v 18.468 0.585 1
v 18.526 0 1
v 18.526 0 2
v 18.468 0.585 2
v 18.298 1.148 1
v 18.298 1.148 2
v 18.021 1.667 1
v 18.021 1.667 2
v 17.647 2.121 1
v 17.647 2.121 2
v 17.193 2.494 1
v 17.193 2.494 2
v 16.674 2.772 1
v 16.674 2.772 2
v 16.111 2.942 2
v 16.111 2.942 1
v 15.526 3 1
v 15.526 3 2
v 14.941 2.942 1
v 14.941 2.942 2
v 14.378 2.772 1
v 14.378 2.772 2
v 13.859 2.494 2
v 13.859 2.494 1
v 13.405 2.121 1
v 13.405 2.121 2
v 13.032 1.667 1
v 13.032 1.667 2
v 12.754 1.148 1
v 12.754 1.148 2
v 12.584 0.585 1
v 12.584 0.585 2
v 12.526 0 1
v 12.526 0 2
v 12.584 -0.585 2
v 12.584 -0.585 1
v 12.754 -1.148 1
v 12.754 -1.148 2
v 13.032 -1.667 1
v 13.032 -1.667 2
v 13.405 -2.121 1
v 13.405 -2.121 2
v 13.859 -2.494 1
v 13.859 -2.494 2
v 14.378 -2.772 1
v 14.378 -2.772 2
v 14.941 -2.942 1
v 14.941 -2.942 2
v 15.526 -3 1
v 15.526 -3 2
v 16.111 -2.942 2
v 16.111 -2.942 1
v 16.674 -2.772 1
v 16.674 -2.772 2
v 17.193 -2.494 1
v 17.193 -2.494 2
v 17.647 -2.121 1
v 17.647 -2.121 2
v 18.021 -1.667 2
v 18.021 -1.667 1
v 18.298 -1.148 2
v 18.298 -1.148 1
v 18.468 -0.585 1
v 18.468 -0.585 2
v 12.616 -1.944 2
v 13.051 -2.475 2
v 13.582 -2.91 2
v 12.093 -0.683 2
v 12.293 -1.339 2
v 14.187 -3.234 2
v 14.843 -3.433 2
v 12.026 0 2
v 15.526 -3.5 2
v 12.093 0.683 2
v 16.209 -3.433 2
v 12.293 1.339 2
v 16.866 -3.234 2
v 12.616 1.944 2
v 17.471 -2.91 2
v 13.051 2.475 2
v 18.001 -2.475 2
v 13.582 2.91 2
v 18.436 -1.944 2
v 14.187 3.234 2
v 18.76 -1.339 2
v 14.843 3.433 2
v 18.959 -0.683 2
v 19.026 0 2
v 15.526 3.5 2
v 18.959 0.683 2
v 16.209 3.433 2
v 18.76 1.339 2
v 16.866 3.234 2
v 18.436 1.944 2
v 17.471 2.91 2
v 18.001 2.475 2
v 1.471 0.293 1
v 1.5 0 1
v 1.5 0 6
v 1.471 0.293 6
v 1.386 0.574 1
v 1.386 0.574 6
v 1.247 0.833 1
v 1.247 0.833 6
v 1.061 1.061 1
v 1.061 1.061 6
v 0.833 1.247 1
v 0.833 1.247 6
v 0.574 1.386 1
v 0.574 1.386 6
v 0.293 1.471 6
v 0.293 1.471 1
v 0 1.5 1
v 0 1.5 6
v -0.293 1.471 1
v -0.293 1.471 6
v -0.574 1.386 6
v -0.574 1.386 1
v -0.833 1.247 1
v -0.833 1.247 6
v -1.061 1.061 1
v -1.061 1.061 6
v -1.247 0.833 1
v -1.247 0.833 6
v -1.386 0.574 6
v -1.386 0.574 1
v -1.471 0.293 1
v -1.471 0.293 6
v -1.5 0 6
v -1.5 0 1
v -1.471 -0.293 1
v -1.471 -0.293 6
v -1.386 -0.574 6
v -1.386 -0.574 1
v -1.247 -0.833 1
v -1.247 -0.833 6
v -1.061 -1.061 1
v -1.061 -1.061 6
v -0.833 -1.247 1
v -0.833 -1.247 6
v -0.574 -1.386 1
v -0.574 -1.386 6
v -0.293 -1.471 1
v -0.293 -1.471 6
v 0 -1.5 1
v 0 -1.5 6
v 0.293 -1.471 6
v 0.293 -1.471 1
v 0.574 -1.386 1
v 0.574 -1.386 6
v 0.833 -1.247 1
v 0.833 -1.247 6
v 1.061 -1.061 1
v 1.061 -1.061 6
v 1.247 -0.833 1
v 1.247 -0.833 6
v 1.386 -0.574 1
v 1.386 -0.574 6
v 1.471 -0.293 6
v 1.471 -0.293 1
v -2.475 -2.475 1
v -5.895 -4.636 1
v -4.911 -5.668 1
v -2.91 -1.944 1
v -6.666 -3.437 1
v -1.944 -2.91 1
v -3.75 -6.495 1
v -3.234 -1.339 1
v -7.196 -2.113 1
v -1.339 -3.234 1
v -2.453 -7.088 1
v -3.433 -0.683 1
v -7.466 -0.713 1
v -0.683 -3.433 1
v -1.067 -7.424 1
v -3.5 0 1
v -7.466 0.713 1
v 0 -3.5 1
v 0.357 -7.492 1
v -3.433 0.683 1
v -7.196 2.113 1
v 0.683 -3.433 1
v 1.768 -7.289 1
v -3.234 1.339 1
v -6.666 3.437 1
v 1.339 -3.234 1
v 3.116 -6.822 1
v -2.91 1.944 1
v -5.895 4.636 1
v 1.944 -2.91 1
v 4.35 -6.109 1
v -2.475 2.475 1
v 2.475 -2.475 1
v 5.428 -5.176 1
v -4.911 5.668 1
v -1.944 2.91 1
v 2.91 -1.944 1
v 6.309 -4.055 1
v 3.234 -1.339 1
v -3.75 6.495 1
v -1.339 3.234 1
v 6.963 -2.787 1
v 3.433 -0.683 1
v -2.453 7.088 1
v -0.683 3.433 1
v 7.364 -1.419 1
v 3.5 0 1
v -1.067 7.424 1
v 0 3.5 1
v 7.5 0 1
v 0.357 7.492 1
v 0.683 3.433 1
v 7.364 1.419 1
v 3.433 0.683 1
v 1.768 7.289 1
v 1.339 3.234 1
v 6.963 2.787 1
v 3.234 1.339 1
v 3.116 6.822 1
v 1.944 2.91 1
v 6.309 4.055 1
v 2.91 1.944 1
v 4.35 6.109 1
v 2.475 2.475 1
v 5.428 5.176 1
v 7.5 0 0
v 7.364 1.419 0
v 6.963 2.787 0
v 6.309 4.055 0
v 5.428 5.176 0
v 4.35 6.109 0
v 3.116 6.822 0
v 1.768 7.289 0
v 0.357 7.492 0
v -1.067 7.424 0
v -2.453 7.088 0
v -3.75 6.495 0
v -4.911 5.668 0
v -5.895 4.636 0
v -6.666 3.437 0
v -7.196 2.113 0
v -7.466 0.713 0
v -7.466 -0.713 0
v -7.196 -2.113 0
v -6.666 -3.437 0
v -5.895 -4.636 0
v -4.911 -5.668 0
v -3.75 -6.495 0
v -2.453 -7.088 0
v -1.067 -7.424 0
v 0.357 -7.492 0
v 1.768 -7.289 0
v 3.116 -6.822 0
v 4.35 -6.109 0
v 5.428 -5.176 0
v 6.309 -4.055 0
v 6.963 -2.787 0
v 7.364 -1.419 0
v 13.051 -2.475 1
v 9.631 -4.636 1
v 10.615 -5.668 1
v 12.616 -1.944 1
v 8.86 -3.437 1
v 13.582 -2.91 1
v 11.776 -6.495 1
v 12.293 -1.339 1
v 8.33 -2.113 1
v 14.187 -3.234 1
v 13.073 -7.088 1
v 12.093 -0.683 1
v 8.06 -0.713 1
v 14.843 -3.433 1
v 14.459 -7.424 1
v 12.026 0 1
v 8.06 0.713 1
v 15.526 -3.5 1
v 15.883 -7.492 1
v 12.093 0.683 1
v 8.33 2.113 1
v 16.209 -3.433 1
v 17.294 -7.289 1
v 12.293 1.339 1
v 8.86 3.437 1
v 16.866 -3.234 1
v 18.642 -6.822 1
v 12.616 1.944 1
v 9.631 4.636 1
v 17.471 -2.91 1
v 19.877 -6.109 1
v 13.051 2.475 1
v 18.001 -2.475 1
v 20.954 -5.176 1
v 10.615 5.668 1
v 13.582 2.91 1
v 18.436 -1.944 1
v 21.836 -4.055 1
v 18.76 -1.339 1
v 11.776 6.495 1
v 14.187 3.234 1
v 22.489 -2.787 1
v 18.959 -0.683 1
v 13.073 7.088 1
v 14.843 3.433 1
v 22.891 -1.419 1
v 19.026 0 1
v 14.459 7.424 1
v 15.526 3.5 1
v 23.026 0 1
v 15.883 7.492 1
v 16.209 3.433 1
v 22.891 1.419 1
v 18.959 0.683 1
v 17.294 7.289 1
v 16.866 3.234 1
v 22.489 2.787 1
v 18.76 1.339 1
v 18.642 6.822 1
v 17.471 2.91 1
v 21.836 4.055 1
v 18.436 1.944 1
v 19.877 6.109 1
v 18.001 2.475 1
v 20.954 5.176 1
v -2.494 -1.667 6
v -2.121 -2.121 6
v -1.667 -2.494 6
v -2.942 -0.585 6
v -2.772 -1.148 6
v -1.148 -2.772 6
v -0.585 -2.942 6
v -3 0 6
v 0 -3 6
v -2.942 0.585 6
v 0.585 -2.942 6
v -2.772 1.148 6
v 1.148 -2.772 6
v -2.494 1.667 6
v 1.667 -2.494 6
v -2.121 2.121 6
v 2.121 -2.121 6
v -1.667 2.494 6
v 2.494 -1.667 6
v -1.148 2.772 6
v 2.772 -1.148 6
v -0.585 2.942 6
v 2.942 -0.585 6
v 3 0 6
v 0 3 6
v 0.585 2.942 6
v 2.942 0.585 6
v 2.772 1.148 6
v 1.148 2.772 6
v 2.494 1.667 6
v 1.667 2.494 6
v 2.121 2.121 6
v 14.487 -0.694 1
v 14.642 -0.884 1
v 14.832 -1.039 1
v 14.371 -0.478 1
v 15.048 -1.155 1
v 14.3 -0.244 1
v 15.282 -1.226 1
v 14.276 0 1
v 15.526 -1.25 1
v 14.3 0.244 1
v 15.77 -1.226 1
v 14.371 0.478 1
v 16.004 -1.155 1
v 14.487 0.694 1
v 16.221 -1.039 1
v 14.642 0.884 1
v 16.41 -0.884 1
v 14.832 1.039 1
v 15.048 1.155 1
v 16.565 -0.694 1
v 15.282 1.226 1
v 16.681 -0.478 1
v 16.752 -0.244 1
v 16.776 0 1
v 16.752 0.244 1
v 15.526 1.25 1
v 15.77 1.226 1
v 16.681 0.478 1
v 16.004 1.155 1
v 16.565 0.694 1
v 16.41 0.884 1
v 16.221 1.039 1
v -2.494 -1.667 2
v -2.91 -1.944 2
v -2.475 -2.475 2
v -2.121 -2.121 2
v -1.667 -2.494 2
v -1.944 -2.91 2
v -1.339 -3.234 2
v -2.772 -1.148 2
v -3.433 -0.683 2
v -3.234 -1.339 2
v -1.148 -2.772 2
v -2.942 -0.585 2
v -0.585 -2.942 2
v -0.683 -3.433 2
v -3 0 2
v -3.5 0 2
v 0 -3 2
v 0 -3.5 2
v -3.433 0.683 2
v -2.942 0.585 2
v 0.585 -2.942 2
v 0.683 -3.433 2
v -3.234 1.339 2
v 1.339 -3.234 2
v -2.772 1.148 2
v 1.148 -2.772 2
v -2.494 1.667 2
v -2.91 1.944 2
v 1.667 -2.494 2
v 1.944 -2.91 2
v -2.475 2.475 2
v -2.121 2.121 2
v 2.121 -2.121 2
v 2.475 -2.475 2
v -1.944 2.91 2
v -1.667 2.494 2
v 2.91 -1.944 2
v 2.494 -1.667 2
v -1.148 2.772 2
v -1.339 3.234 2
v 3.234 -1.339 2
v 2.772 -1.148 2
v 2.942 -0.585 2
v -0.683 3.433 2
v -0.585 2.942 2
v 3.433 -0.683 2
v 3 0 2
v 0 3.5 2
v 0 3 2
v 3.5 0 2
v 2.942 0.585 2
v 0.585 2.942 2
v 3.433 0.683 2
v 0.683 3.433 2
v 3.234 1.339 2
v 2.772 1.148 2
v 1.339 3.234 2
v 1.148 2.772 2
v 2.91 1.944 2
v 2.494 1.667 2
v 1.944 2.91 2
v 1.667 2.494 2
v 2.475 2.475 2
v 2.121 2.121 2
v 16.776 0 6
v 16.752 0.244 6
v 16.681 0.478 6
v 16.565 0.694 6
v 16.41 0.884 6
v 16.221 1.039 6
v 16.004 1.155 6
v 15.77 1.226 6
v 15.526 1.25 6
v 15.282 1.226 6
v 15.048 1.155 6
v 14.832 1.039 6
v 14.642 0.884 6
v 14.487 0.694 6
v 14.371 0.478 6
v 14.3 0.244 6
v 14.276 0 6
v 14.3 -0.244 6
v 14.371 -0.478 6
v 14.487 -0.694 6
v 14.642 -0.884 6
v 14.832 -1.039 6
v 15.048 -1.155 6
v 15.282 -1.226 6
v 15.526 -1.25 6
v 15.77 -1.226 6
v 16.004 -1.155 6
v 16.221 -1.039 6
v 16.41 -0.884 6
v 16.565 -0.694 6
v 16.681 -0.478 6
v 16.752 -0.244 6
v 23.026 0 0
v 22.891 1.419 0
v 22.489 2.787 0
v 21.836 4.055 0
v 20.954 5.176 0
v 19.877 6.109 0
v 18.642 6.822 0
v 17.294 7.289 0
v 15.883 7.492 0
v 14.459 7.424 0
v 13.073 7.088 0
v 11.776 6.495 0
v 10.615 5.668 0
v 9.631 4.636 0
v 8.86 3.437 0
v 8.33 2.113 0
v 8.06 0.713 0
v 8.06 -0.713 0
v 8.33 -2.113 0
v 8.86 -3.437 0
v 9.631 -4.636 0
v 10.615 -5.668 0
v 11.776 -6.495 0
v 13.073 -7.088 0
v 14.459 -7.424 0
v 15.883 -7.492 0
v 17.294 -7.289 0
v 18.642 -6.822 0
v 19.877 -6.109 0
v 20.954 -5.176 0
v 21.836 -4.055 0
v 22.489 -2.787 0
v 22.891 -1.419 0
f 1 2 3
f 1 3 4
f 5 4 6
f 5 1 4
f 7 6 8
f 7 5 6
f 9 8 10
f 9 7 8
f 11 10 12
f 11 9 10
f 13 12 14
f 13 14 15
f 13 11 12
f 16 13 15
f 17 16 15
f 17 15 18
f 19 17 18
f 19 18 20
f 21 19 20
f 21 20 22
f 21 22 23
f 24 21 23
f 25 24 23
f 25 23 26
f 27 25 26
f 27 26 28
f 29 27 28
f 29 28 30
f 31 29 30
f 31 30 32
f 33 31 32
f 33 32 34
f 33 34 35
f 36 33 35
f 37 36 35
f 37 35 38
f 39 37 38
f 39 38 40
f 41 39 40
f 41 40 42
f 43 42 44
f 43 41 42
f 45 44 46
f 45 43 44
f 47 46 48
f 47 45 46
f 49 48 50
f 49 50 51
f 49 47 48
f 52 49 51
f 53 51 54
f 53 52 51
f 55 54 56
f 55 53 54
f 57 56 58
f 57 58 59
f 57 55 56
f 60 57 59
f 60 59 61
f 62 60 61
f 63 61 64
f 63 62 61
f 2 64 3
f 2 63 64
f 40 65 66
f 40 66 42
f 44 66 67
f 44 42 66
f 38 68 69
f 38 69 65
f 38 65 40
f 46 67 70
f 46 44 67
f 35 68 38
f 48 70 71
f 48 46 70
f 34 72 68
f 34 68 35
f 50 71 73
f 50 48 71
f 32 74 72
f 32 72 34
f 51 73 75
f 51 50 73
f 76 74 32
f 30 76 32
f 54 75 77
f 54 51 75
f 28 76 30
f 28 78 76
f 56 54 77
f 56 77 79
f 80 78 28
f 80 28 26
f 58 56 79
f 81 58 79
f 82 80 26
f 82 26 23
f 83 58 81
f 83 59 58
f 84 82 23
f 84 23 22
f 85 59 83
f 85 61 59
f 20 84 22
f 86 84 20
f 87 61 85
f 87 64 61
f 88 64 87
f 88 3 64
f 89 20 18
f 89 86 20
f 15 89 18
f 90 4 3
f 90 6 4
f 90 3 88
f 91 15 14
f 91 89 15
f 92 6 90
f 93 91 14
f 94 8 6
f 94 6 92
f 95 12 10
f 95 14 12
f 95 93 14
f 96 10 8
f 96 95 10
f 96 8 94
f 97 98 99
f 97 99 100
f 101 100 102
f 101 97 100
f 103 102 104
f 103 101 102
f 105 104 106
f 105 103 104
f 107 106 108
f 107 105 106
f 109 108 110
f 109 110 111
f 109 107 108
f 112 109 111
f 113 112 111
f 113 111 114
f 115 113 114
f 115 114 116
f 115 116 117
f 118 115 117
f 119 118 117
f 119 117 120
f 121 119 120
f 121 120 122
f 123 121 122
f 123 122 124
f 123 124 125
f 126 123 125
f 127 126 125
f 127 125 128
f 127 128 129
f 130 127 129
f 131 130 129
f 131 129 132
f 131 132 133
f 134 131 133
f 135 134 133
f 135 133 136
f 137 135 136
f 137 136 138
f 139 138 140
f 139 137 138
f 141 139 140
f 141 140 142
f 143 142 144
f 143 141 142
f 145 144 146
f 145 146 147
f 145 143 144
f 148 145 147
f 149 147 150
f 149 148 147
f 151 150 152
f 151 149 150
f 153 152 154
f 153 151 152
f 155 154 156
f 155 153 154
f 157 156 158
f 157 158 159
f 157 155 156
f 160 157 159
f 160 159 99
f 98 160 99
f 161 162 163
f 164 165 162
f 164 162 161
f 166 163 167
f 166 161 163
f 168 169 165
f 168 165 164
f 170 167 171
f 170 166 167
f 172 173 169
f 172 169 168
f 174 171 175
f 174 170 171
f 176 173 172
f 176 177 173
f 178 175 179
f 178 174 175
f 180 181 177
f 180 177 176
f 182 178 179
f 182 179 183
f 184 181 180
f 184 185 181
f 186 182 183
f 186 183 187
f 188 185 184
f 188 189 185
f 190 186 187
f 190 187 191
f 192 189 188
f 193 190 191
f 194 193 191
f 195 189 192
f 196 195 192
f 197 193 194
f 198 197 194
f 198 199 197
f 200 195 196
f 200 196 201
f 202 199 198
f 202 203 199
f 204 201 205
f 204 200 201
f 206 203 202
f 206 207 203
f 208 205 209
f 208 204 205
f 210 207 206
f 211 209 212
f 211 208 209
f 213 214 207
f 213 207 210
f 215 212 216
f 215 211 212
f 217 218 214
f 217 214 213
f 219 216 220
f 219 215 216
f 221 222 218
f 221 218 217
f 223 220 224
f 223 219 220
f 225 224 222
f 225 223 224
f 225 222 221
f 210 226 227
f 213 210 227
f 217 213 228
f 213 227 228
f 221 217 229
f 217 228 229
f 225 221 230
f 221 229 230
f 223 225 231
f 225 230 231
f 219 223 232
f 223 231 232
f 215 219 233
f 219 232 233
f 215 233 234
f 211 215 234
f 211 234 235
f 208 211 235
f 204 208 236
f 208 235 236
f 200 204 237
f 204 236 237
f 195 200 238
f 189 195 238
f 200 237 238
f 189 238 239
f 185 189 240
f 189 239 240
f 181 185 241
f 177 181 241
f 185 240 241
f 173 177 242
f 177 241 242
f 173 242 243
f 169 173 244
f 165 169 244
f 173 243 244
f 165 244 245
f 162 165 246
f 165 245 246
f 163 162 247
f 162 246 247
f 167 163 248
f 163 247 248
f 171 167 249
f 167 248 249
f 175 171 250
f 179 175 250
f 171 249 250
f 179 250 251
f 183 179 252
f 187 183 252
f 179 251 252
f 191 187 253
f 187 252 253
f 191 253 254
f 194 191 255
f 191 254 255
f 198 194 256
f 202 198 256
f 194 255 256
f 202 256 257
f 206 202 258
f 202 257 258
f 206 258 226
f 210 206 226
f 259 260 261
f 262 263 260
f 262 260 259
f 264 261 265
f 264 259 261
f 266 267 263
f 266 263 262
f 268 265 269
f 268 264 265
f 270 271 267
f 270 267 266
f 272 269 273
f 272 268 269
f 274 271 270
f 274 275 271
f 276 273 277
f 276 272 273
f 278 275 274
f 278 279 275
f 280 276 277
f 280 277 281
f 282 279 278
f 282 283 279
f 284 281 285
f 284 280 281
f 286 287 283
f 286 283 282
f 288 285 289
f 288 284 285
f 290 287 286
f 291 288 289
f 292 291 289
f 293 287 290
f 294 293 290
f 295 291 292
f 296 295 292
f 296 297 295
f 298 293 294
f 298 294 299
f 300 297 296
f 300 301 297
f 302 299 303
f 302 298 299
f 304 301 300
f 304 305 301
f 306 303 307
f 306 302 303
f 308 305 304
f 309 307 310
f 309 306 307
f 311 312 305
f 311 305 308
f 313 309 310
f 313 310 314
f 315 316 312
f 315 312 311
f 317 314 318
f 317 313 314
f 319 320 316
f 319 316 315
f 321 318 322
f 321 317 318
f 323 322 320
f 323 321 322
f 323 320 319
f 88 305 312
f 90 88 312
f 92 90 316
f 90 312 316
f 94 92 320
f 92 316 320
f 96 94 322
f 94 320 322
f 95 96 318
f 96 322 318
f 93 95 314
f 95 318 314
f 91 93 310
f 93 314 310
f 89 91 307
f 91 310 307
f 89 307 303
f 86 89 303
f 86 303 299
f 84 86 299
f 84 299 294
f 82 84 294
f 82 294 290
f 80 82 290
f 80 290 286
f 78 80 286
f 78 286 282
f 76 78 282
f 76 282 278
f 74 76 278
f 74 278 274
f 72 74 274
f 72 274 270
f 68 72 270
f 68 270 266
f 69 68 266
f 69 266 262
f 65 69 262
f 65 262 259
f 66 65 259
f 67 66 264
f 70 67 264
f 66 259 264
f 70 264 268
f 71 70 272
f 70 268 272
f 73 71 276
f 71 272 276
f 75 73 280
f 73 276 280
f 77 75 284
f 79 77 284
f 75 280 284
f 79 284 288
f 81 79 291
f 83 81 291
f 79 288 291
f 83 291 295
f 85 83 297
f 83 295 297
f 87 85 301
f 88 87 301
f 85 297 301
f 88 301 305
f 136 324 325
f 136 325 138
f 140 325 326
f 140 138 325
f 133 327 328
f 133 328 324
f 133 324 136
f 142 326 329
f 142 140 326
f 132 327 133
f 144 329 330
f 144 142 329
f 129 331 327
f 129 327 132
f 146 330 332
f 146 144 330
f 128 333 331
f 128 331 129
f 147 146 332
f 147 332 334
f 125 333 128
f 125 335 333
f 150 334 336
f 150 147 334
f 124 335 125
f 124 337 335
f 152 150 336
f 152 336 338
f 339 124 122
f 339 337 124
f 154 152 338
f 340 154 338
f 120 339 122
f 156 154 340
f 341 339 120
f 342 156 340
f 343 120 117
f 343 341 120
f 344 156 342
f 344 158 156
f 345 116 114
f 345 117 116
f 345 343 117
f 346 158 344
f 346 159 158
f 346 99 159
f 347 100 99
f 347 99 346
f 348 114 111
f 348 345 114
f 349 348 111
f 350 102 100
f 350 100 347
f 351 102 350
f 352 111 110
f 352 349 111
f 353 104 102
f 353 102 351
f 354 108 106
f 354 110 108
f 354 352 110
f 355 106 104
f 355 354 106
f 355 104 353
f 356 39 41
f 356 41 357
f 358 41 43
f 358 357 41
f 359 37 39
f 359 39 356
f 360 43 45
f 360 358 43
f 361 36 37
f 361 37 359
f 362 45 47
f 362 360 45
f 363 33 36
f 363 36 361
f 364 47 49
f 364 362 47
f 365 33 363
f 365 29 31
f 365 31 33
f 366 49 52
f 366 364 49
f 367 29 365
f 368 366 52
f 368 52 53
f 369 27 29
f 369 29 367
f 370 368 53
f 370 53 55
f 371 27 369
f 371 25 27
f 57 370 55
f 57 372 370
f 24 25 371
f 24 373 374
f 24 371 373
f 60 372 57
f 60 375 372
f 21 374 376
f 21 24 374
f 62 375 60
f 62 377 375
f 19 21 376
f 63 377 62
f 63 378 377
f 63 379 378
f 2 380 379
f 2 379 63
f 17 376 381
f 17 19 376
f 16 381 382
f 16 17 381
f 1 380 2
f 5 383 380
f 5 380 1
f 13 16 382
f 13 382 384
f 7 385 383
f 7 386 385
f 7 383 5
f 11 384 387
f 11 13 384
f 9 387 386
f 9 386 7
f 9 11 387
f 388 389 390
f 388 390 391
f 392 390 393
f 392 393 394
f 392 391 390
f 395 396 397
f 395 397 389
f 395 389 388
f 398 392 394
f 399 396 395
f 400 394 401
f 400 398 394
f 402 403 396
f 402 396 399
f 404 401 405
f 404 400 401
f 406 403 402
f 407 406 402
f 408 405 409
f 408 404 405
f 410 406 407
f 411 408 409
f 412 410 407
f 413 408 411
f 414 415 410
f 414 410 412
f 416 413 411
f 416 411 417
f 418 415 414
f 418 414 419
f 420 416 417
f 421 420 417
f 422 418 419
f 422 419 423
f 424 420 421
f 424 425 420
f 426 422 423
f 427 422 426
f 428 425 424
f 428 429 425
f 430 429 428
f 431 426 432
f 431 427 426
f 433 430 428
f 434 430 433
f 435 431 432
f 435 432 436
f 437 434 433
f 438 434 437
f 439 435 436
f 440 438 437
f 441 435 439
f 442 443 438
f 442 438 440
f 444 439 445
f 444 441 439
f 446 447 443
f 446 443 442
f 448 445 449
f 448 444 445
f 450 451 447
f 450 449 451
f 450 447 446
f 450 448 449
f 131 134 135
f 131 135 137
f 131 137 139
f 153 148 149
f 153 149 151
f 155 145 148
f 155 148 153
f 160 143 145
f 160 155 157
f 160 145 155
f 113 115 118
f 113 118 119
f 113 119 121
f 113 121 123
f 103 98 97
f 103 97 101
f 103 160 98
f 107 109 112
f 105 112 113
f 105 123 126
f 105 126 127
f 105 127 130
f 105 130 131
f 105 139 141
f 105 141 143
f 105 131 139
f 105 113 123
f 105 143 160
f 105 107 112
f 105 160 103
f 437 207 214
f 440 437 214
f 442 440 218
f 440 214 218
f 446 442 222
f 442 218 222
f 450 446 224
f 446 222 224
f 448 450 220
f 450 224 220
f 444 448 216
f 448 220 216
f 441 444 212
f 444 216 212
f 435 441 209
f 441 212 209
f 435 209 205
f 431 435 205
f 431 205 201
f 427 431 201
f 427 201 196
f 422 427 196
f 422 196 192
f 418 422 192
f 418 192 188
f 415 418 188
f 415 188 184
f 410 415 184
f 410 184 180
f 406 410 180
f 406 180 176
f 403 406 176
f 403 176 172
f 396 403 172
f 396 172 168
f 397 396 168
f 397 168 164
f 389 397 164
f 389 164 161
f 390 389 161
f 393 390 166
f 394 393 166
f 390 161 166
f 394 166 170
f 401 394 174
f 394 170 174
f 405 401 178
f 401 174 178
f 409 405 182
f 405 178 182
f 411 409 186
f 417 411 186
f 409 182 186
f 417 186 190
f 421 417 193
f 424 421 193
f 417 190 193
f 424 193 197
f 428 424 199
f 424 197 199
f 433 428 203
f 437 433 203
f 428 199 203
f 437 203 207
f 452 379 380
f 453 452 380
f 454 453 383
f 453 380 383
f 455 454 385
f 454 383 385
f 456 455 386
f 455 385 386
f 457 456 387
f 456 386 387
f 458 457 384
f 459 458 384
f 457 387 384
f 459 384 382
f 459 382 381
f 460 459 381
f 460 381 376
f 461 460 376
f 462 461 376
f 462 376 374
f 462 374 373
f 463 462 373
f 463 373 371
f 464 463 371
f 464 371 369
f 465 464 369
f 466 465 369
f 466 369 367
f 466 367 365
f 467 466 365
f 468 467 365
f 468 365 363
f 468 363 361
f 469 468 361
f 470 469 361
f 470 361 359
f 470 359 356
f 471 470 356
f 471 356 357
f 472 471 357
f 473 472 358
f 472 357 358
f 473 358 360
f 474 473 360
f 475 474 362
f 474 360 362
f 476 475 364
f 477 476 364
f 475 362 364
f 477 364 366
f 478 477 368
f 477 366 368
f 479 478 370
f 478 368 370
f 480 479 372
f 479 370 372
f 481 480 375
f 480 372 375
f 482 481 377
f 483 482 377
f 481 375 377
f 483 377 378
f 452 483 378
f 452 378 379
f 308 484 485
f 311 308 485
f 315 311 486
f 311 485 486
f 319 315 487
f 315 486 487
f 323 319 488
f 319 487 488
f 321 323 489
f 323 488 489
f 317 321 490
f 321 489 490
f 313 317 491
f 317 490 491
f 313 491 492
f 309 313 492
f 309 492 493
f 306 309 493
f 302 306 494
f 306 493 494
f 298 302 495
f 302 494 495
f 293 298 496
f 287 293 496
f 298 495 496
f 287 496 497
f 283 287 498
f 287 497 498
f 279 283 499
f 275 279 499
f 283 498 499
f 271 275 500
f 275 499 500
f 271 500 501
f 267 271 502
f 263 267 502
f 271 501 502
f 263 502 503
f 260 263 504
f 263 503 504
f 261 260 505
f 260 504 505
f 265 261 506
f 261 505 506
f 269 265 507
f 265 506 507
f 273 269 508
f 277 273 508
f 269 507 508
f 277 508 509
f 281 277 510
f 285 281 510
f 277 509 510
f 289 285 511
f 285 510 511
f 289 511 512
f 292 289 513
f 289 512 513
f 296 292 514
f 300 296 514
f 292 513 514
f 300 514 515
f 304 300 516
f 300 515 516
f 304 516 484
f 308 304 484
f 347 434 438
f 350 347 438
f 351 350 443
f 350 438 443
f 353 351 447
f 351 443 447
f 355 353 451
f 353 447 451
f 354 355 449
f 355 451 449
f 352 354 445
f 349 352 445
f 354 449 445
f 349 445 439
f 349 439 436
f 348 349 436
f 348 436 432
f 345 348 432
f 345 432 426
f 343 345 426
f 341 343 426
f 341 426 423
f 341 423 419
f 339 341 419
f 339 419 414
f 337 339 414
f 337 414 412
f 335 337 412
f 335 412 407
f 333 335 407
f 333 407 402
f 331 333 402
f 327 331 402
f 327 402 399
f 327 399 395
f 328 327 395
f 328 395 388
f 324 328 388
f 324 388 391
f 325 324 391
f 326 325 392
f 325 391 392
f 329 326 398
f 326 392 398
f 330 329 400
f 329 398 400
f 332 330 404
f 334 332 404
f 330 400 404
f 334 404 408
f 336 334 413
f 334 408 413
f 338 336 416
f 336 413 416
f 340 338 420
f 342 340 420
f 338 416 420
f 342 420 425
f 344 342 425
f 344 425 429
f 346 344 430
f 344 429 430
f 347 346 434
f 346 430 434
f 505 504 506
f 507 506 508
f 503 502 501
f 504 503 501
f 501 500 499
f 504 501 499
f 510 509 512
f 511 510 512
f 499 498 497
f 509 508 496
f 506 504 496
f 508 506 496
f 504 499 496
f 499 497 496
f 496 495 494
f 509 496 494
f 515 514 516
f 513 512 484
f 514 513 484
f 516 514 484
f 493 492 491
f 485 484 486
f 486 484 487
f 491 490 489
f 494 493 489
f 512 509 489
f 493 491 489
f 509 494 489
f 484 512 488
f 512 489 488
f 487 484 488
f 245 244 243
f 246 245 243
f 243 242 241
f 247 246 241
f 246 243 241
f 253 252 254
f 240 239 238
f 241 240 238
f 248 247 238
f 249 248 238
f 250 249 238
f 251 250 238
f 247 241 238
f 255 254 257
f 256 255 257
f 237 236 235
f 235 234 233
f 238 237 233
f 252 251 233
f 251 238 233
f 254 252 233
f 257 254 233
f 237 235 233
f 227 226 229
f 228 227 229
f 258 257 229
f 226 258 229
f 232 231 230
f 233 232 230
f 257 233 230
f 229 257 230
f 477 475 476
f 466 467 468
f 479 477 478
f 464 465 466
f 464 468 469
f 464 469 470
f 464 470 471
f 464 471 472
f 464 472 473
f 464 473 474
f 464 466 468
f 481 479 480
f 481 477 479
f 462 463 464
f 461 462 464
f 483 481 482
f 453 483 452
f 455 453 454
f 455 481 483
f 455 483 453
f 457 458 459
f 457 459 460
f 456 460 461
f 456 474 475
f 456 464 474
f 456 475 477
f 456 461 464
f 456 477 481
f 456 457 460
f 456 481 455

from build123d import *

# Parameters (mm, degrees)
F0_R     = 7.5
F0_R_2   = 3.5
F1_DEPTH = 1
F0_R_3   = 3
F2_DEPTH = 2
F0_R_4   = 1.5
F0_R_5   = 1.25
F3_DEPTH = 6
F4_DEPTH = 1


with BuildPart() as f1:
    # F0 (on Top) → F1 (new body)
    with BuildSketch(Plane.XY):
        Circle(F0_R)
        Circle(F0_R_2, mode=Mode.SUBTRACT)
        with Locations((15.526113, 0)):
            Circle(F0_R)
        with Locations((15.526113, 0)):
            Circle(F0_R_2, mode=Mode.SUBTRACT)
    extrude(amount=F1_DEPTH)

    # F0 (on Top) → F2 (join)
    with BuildSketch(Plane.XY):
        Circle(F0_R_2)
        Circle(F0_R_3, mode=Mode.SUBTRACT)
        with Locations((15.526113, 0)):
            Circle(F0_R_2)
        with Locations((15.526113, 0)):
            Circle(F0_R_3, mode=Mode.SUBTRACT)
    extrude(amount=F2_DEPTH)

    # F0 (on Top) → F3 (join)
    with BuildSketch(Plane.XY):
        Circle(F0_R_3)
        Circle(F0_R_4, mode=Mode.SUBTRACT)
        with Locations((15.526113, 0)):
            Circle(F0_R_5)
    extrude(amount=F3_DEPTH)

    # F0 (on Top) → F4 (join)
    with BuildSketch(Plane.XY):
        Circle(F0_R_4)
        with Locations((15.526113, 0)):
            Circle(F0_R_3)
        with Locations((15.526113, 0)):
            Circle(F0_R_5, mode=Mode.SUBTRACT)
    extrude(amount=F4_DEPTH)


solid = f1.part
